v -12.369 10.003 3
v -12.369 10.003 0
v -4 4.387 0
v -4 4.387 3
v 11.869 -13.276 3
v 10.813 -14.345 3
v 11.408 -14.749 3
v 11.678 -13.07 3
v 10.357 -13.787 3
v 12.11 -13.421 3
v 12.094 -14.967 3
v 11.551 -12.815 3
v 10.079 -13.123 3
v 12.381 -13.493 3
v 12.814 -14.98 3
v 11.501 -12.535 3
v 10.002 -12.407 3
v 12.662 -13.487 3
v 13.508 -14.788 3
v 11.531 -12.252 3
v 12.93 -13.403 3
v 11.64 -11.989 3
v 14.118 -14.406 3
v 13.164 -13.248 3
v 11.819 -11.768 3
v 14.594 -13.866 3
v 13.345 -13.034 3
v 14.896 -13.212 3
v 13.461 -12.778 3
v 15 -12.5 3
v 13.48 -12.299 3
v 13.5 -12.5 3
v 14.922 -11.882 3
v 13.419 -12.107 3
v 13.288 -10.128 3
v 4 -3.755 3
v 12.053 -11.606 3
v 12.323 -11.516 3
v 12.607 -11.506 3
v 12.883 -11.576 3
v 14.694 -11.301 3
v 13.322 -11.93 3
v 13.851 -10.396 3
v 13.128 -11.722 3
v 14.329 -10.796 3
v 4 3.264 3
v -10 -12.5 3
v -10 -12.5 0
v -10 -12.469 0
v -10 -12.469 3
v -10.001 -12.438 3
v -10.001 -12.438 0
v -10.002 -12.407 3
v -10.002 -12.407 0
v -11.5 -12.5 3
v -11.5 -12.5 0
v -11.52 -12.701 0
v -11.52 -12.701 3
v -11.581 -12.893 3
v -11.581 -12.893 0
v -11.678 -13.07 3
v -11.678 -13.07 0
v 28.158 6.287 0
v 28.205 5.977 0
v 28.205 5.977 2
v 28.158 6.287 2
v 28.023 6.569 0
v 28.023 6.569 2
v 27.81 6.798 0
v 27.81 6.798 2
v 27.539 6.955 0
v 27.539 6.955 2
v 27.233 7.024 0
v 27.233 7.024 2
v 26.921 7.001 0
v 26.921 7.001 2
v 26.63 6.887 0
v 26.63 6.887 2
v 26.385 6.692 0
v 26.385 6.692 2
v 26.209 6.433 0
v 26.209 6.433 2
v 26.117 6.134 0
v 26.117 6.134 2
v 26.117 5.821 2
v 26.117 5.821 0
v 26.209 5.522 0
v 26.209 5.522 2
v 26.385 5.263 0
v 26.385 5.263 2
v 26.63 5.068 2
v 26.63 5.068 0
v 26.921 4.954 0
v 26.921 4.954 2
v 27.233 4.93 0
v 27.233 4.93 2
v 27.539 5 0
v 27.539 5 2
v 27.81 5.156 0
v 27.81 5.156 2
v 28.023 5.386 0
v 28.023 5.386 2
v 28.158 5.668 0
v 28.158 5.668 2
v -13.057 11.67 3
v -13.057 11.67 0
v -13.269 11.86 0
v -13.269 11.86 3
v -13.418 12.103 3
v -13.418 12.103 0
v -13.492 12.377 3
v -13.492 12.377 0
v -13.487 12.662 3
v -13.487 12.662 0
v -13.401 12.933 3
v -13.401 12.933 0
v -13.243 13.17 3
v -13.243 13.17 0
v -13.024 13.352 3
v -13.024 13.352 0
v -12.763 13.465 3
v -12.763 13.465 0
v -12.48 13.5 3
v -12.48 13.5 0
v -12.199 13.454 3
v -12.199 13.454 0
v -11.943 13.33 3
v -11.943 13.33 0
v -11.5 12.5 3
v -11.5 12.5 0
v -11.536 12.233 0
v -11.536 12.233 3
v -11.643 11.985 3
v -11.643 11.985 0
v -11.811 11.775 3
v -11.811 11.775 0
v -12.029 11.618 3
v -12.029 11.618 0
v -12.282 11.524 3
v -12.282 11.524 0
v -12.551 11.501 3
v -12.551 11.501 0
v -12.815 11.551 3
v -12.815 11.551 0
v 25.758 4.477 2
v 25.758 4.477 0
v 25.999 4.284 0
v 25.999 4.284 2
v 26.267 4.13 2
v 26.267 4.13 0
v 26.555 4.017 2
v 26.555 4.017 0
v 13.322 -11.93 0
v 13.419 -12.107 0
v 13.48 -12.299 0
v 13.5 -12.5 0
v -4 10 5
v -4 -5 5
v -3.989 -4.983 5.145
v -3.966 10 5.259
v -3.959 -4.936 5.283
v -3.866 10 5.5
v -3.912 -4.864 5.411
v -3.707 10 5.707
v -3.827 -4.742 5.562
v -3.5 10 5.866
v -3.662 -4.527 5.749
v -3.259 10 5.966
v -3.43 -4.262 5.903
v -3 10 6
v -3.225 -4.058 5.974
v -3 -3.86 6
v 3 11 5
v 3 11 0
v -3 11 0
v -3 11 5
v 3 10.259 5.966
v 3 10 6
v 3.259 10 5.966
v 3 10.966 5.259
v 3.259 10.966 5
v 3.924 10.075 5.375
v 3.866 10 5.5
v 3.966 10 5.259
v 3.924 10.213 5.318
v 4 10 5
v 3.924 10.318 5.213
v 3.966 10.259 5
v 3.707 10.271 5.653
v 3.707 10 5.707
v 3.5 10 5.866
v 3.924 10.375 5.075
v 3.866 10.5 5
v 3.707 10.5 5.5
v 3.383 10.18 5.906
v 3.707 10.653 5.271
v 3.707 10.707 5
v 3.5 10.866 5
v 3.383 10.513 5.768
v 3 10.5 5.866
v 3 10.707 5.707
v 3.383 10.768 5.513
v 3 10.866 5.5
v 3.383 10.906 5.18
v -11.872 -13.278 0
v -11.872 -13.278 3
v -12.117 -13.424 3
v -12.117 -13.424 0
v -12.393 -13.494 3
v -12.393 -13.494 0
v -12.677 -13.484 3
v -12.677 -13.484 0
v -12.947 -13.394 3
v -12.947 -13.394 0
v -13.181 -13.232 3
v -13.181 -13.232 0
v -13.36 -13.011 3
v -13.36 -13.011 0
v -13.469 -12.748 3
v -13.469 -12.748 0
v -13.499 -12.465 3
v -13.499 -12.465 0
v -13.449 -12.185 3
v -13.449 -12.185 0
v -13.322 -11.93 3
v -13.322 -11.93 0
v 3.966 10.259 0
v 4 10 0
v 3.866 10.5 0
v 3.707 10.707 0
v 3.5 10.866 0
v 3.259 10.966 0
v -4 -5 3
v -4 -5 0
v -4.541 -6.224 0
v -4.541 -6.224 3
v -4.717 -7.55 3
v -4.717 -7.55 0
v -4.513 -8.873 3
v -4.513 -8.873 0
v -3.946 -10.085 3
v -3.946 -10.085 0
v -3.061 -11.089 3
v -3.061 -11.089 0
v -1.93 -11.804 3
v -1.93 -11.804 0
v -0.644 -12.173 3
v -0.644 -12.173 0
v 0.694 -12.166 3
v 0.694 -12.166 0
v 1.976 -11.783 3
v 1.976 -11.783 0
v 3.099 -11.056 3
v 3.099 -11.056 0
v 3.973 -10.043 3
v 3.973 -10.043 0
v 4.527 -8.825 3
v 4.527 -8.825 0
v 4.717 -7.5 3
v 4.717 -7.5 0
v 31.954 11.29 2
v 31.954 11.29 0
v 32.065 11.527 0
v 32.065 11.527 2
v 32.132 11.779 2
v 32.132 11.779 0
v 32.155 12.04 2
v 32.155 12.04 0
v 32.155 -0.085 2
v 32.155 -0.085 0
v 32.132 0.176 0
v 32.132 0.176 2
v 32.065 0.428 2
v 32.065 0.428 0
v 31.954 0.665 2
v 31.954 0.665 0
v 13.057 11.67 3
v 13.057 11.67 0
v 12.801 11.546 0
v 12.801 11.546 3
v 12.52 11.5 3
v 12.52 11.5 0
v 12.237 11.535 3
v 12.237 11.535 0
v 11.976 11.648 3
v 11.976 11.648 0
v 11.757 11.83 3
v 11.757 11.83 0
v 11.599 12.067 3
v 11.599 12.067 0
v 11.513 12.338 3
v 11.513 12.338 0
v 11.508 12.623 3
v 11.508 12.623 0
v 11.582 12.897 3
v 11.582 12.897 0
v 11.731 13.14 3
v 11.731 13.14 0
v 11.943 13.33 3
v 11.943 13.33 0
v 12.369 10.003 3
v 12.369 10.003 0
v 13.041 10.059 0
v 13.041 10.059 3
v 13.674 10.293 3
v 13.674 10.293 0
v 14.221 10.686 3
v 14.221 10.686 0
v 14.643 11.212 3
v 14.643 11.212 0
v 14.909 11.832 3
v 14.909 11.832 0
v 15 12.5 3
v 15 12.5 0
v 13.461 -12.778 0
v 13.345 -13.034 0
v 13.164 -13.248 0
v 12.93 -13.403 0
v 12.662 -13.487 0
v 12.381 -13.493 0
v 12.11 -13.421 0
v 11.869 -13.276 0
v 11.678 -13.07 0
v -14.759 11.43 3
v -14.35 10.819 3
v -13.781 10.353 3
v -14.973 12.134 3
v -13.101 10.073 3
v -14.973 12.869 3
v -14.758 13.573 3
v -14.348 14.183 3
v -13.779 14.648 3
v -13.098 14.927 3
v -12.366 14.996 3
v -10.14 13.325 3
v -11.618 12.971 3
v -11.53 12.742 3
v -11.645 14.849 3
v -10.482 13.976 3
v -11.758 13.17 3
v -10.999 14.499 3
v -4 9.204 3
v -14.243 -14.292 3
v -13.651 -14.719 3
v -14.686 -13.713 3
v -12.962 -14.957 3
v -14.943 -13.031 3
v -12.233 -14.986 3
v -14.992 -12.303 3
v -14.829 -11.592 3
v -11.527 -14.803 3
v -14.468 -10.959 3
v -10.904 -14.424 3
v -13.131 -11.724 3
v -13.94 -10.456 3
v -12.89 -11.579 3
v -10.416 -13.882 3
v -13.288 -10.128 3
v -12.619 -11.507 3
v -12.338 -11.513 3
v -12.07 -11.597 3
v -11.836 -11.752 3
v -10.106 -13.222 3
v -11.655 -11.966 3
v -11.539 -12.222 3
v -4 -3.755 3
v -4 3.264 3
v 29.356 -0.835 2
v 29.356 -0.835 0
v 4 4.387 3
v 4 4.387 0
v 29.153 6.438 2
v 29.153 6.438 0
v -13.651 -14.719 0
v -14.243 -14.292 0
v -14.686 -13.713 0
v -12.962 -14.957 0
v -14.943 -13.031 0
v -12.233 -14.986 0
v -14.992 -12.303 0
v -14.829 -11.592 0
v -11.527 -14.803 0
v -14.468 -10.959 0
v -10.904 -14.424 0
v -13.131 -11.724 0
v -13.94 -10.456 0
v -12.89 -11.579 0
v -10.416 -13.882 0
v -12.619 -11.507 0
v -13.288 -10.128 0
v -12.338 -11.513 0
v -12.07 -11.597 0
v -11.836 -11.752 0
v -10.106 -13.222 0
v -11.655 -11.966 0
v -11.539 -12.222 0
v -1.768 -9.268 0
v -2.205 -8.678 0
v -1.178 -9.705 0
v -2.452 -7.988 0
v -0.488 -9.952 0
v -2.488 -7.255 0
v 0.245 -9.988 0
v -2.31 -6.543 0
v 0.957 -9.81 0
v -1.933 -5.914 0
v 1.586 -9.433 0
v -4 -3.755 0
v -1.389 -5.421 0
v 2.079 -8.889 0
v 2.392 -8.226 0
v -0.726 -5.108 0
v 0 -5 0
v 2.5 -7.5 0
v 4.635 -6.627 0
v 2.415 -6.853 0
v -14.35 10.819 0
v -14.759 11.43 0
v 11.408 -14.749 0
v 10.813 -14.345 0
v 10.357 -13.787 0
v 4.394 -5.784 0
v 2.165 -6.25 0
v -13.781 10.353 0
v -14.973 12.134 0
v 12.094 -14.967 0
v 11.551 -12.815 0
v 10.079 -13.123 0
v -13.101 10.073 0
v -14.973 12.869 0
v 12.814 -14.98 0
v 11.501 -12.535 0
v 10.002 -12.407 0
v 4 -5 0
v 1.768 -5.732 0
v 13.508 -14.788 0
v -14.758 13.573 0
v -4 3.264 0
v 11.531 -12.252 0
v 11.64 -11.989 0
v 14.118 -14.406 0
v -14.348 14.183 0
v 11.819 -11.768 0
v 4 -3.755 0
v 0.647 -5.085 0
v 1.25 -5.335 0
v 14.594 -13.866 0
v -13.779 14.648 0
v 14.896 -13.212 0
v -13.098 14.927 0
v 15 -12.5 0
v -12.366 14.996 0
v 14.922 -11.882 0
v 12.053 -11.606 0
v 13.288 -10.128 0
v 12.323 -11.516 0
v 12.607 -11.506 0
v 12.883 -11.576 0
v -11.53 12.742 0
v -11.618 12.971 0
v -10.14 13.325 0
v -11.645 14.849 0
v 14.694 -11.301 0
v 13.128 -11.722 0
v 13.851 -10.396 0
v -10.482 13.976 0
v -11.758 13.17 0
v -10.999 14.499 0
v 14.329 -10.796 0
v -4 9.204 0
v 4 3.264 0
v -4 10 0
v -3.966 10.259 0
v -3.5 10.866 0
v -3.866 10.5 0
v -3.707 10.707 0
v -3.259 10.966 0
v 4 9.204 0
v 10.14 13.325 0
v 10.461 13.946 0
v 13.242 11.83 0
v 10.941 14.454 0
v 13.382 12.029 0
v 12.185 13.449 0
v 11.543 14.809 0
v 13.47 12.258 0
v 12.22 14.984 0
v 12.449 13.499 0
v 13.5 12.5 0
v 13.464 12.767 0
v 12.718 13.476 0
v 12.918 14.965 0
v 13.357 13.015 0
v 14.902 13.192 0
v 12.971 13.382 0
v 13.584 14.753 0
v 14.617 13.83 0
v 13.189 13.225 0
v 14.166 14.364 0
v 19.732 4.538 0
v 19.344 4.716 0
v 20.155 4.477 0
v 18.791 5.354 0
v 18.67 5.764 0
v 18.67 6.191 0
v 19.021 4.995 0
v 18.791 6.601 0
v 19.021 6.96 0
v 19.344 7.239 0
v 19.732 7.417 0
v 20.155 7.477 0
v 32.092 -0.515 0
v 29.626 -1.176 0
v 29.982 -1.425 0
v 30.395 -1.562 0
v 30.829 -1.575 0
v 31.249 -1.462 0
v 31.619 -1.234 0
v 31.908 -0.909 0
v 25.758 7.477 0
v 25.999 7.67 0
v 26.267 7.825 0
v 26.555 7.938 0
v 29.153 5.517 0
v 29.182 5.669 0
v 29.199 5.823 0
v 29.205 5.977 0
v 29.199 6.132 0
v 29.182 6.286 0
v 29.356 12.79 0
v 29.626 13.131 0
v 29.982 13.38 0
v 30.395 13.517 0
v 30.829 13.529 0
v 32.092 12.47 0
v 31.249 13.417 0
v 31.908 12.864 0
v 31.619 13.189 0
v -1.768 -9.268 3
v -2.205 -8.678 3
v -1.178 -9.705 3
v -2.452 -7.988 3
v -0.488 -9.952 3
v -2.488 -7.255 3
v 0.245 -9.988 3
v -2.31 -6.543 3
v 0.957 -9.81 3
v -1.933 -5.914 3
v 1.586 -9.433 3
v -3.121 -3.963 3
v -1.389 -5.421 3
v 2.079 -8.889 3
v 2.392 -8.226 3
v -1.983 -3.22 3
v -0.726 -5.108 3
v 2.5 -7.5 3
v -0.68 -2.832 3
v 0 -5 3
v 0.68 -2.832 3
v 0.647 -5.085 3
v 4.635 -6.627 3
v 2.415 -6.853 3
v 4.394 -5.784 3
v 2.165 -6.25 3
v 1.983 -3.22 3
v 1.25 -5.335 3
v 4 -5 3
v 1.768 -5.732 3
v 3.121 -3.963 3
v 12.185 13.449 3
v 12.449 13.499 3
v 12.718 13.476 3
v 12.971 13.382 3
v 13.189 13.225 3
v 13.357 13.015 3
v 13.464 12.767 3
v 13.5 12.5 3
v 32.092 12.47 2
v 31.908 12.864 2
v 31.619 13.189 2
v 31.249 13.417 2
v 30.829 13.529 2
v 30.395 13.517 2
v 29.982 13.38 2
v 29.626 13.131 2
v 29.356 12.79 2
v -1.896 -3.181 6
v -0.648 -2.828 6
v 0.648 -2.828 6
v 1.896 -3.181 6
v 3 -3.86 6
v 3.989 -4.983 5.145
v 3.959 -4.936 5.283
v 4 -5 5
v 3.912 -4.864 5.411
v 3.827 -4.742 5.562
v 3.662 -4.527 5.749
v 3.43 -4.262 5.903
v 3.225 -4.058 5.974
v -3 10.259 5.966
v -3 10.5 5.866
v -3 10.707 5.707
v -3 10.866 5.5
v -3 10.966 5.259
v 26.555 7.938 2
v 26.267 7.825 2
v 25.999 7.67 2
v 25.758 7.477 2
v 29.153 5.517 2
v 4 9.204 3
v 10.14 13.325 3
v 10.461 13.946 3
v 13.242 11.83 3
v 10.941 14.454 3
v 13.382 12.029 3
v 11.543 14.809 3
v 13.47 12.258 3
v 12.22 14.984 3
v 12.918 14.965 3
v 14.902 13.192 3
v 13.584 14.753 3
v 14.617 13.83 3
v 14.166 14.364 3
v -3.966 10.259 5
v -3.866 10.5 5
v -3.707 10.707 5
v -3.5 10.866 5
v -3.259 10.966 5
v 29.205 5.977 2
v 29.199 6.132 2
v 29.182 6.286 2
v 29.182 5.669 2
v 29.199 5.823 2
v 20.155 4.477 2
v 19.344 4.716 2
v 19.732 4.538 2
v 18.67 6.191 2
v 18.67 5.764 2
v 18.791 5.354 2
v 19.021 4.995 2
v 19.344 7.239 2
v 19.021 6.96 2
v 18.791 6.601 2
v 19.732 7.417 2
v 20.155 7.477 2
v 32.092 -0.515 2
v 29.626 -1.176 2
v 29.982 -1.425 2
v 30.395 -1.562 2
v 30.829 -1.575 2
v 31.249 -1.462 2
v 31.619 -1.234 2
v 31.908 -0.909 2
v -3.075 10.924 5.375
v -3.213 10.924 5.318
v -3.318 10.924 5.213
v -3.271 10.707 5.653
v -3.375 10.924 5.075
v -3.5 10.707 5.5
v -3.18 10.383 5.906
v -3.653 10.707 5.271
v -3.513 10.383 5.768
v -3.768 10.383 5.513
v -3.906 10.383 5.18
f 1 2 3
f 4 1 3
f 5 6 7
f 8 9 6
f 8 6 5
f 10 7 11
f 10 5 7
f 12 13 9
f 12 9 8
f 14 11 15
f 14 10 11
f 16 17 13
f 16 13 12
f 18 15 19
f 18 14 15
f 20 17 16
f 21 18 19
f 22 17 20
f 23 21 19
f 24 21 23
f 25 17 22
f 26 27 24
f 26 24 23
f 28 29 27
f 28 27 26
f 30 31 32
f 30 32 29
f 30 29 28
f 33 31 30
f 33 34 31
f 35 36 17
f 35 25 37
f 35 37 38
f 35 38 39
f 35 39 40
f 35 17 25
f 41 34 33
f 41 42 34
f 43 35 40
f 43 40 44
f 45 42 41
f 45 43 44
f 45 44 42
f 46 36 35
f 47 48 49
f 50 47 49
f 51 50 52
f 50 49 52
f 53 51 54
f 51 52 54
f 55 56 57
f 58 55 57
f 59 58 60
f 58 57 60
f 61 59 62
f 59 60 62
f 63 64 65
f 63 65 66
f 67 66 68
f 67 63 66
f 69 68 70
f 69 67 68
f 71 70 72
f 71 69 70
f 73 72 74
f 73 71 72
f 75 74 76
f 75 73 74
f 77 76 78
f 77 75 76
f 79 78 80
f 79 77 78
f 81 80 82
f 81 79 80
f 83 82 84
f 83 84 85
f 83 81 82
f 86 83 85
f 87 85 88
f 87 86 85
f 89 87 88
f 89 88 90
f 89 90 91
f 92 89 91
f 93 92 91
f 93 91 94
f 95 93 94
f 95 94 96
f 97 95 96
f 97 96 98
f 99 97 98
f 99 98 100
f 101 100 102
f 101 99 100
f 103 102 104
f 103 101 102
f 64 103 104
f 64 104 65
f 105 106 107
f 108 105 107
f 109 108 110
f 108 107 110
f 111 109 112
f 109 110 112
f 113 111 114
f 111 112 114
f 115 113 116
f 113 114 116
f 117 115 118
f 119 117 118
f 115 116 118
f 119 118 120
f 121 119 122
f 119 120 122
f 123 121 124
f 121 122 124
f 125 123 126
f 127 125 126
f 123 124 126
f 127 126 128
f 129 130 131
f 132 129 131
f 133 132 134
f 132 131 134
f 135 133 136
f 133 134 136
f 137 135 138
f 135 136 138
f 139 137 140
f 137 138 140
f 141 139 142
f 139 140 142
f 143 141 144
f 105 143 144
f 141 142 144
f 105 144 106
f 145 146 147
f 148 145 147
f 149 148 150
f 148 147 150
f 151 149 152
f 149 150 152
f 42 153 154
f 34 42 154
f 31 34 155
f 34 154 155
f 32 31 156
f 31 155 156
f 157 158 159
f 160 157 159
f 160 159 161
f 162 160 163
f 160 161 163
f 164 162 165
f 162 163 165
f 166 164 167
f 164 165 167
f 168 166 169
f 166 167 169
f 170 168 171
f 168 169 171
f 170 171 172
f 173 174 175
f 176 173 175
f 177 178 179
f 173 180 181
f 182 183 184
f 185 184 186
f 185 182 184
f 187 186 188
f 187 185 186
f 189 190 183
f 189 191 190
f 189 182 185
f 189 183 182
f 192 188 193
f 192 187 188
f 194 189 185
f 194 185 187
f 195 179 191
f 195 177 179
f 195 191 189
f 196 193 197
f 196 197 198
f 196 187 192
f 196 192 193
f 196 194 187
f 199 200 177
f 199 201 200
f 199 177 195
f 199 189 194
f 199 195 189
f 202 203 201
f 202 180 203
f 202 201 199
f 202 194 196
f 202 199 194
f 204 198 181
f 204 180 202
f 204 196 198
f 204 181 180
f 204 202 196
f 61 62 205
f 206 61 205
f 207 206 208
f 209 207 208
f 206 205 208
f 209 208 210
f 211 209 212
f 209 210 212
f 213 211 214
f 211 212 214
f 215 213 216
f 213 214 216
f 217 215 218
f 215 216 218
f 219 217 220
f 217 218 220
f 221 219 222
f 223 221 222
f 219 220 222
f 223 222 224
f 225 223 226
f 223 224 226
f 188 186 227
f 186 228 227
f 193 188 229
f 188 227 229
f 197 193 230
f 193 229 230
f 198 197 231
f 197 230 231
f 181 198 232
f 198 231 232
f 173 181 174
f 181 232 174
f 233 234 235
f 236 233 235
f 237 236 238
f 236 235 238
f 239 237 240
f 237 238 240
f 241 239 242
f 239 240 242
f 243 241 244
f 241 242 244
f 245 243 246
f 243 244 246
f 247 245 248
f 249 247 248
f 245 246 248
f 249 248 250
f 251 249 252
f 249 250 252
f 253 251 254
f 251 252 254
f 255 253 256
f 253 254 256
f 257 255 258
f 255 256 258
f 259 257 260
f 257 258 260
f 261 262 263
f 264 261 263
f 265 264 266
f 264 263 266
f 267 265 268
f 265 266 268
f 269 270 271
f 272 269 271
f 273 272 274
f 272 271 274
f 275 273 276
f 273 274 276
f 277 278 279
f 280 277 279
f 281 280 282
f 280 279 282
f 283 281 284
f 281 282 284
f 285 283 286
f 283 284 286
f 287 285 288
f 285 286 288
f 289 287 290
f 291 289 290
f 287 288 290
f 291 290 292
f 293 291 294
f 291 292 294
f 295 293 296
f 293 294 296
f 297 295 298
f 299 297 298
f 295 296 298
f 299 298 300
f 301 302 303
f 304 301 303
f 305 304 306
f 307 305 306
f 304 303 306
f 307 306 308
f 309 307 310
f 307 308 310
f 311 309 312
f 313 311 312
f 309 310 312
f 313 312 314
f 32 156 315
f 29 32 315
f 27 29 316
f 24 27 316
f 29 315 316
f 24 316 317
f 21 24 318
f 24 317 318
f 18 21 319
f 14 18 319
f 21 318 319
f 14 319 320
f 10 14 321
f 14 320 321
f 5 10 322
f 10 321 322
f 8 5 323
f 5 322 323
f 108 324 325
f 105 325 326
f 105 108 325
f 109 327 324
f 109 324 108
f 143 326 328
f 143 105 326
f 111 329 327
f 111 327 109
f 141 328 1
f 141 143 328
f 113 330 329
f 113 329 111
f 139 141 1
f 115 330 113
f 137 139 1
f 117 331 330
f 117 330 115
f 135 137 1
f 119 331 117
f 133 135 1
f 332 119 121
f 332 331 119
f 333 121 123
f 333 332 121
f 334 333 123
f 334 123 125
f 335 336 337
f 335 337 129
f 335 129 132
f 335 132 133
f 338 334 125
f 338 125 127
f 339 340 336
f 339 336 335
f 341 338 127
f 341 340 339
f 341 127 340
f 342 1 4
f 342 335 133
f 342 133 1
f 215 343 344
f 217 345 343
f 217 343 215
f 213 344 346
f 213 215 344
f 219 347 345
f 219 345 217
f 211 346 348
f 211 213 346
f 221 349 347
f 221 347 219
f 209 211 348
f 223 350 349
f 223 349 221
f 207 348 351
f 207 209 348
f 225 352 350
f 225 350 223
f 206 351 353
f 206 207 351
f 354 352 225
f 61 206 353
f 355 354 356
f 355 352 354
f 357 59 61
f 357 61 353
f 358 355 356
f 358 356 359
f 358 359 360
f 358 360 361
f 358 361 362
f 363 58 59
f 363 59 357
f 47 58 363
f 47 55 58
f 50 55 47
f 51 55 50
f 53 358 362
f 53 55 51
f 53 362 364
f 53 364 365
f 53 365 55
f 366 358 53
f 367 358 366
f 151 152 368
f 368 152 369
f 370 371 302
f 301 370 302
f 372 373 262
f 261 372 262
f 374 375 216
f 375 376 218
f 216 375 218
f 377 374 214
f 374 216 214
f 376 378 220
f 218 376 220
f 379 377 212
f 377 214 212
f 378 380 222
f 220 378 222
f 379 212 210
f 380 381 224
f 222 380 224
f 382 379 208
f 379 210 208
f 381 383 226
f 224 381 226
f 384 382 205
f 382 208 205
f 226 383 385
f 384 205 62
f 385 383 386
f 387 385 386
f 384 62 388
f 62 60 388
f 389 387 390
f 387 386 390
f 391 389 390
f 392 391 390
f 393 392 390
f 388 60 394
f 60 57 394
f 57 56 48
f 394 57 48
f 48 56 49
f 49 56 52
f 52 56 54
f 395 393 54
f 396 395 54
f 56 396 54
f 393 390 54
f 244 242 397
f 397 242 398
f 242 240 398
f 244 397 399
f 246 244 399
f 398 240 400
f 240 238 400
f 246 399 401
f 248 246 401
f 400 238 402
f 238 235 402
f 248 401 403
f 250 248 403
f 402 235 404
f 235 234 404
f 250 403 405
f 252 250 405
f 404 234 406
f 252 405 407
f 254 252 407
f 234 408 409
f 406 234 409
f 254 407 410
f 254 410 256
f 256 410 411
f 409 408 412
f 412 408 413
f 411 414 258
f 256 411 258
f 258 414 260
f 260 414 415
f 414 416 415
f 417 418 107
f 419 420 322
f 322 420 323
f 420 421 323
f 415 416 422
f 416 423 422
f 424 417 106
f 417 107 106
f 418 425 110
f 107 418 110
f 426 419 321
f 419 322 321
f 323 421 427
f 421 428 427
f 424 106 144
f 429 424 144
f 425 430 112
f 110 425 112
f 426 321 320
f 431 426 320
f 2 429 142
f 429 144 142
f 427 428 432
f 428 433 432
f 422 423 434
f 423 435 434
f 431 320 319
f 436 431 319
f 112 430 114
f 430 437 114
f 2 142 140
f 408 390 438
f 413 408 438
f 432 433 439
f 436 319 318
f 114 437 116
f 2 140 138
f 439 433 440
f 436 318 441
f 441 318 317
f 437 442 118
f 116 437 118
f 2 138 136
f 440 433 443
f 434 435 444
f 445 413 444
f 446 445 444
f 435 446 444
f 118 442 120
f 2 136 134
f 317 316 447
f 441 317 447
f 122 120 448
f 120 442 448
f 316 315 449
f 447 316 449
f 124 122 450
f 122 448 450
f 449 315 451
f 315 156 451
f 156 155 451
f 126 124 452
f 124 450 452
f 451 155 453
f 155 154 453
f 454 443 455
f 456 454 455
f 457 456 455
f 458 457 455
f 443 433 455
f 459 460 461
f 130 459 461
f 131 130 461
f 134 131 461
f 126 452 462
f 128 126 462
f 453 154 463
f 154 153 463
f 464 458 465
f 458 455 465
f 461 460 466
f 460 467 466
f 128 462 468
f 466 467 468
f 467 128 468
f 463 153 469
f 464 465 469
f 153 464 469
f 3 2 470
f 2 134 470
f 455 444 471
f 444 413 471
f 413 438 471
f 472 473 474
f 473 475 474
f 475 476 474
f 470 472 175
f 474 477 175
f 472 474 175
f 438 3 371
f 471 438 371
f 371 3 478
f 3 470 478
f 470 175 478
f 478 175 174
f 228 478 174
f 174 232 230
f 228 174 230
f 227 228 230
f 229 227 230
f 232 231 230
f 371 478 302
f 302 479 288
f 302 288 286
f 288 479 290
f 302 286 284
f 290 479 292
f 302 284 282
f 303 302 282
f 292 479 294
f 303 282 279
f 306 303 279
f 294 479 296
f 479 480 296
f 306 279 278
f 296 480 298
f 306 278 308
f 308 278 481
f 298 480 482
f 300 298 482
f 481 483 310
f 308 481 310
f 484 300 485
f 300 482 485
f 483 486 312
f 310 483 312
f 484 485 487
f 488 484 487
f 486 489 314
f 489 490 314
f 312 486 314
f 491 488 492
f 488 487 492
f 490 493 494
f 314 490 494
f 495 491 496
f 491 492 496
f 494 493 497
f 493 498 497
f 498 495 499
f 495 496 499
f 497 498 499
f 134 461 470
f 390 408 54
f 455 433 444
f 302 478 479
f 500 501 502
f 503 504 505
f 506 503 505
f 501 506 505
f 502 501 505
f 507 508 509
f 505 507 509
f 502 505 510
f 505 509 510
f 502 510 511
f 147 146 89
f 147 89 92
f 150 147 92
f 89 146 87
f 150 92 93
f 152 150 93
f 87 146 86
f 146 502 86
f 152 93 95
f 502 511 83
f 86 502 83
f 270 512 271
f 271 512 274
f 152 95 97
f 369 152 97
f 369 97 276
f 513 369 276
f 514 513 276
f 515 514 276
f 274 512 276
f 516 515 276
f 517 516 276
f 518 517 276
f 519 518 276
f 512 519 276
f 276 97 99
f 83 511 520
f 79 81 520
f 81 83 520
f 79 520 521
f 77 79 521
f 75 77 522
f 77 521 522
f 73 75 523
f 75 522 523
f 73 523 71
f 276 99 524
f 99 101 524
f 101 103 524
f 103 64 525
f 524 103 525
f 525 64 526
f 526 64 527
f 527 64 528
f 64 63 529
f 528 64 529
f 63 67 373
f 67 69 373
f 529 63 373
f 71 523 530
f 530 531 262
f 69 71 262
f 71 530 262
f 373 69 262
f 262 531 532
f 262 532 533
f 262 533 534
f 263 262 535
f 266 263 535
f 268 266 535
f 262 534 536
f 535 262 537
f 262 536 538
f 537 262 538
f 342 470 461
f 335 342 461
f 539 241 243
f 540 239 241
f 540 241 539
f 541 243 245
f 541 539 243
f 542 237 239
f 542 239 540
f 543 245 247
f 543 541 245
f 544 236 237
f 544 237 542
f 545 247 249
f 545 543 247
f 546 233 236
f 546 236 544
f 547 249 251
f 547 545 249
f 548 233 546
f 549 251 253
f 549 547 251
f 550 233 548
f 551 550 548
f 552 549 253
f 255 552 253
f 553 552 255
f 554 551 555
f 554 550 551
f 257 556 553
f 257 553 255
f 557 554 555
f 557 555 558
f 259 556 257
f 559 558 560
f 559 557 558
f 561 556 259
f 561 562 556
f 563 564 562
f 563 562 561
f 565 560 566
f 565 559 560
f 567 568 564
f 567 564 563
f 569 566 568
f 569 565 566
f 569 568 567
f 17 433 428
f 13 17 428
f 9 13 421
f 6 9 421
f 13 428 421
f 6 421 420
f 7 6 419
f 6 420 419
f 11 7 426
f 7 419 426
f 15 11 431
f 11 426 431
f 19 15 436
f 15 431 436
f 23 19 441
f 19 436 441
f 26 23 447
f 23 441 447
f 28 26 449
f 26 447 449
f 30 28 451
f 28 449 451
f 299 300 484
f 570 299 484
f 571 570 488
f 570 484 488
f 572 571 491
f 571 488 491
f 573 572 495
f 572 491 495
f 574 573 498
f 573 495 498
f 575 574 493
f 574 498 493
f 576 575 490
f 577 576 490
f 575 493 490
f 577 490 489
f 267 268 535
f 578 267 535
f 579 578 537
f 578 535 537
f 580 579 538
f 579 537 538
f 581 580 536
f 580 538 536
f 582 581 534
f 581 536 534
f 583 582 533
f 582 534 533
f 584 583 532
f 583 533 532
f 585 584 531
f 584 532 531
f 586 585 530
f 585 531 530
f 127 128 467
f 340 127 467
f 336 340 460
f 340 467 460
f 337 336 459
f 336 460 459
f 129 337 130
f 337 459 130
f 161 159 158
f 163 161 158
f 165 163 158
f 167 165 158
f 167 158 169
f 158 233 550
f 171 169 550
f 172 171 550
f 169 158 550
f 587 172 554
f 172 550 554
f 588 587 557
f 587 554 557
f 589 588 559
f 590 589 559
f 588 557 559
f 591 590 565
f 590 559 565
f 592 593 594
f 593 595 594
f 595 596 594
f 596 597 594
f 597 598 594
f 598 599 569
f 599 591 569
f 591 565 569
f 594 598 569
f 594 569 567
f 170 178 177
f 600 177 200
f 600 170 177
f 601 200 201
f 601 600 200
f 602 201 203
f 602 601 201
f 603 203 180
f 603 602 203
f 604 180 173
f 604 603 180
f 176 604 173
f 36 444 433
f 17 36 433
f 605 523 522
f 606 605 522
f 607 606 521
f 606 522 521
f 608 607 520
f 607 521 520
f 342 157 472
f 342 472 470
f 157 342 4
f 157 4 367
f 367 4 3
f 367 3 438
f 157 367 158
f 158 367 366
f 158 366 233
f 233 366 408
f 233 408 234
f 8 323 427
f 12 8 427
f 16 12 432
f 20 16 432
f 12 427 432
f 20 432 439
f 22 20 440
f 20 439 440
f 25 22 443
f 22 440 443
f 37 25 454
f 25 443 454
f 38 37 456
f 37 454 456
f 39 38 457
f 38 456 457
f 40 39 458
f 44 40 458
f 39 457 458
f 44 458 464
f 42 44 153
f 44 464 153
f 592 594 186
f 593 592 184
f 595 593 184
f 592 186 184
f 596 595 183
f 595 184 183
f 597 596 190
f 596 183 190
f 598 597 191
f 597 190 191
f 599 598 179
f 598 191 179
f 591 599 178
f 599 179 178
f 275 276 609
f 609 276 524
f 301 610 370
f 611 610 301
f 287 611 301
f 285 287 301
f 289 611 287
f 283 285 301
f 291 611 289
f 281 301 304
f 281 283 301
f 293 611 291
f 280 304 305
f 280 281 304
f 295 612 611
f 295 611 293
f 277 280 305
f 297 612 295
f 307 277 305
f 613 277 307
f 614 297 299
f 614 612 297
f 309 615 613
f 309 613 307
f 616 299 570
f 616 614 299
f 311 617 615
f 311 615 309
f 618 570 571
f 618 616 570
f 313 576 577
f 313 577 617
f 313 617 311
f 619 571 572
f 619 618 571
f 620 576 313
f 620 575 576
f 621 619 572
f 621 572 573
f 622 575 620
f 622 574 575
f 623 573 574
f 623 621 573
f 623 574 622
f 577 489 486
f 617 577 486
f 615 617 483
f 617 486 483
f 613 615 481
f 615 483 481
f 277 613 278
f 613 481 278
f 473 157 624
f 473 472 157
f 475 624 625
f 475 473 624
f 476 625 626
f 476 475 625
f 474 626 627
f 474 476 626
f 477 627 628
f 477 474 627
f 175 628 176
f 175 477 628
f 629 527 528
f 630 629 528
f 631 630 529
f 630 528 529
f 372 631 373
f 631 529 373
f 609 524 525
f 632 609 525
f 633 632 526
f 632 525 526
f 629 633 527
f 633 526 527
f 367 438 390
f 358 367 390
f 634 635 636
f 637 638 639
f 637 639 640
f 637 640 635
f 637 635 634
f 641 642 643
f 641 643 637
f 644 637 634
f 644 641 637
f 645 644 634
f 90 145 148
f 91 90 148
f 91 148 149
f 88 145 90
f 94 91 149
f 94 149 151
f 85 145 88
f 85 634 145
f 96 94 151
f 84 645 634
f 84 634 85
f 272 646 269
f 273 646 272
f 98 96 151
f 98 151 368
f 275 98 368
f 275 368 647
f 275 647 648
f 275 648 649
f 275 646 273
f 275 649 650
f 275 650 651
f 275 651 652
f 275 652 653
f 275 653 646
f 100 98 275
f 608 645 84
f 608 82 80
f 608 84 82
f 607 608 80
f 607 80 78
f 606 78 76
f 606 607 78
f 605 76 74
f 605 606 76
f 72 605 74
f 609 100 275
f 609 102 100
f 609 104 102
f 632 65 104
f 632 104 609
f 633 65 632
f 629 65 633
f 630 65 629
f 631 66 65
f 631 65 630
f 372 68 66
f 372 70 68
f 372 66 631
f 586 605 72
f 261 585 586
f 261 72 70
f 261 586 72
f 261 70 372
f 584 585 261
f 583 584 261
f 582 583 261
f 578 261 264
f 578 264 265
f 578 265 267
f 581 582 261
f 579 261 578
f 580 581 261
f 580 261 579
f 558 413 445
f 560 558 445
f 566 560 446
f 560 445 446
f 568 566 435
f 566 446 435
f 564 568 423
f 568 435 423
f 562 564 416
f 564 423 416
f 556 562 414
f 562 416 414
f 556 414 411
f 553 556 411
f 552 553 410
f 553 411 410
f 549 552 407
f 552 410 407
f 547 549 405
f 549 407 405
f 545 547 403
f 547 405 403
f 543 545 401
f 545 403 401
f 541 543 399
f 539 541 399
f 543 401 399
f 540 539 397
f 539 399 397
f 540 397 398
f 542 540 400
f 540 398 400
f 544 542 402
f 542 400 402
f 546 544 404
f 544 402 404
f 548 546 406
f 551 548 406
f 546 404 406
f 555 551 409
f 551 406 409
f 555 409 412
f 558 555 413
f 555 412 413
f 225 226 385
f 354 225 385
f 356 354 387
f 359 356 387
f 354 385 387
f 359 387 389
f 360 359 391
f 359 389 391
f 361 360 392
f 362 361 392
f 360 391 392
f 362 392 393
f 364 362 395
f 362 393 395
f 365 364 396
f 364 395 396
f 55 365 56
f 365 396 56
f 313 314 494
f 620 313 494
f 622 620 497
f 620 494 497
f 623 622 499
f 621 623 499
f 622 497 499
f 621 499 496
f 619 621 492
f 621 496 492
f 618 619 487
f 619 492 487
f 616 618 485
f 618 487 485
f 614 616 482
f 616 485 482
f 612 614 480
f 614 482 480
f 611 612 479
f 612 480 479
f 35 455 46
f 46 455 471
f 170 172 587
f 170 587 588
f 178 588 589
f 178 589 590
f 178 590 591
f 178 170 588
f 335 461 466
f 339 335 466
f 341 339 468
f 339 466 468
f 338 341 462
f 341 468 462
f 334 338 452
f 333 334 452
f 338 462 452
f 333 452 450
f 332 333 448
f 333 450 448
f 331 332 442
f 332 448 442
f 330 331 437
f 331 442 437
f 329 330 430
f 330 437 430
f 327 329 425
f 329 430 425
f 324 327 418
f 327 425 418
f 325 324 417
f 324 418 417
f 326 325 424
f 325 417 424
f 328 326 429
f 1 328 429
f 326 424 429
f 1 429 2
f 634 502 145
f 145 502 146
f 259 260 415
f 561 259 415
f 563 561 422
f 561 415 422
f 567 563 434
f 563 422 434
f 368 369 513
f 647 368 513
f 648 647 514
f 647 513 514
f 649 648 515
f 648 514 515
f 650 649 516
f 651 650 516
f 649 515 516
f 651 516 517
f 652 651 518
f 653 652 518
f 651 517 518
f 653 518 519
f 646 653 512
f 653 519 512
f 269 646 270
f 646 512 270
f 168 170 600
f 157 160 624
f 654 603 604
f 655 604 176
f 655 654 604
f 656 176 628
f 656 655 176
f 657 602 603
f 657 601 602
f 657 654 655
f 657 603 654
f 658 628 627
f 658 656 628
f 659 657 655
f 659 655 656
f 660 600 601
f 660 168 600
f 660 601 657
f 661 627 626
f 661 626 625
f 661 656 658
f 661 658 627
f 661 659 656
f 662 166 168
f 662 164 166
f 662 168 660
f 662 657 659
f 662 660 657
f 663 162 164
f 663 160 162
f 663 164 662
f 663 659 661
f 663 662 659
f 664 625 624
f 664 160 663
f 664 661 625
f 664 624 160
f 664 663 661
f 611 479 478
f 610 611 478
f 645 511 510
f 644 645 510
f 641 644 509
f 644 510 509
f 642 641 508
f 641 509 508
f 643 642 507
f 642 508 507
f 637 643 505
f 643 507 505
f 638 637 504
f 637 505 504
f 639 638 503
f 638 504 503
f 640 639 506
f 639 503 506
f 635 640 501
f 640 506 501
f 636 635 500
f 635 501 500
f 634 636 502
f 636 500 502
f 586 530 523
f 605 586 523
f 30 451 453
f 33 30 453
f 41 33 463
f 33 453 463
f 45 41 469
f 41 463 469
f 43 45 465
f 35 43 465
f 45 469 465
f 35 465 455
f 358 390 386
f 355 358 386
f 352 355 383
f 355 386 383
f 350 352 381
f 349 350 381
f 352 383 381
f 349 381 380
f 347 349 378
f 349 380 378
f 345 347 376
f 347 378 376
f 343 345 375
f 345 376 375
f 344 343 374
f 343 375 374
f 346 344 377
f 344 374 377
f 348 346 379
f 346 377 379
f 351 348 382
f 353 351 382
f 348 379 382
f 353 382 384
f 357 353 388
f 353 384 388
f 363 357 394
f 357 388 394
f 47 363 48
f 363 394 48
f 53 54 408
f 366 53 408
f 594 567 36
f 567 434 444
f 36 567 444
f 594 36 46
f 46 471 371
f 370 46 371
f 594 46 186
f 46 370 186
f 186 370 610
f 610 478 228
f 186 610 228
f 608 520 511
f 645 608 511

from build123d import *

# Parameters (mm, degrees)
F1_DEPTH = 3
F2_DEPTH = 6
F0_R     = 1.05
F3_DEPTH = 2
F4_R     = 1


with BuildPart() as f1:
    # F0 (on Top) → F1 (new body)
    with BuildSketch(Plane.XY):
        with BuildLine():
            ThreePointArc((-13.0572436168, 11.669650946), (-13.330349054, 13.0572436168), (-11.9427563832, 13.330349054))
            Line((-11.9427563832, 13.330349054), (-10.0401876865, 12.0535435267))
            ThreePointArc((-10.0401876865, 12.0535435267), (-10.0100671913, 12.2758692164), (-10, 12.5))
            ThreePointArc((-10, 12.5), (-10.0352457489, 12.9183138554), (-10.1399891853, 13.3248326828))
            ThreePointArc((-10.1399891853, 13.3248326828), (-14.575872635, 13.8931090421), (-12.3689636526, 10.0034364667))
            ThreePointArc((-12.3689636526, 10.0034364667), (-11.7365731215, 10.1194161638), (-11.1546749202, 10.3928454187))
            Line((-11.1546749202, 10.3928454187), (-13.0572436168, 11.669650946))
        make_face()
        with BuildLine():
            ThreePointArc((-10, 12.5), (-10.0100671913, 12.2758692164), (-10.0401876865, 12.0535435267))
            Line((-10.0401876865, 12.0535435267), (-4, 8))
            Line((-4, 8), (-4, 9.204312807))
            Line((-4, 9.204312807), (-10.1399891853, 13.3248326828))
            ThreePointArc((-10.1399891853, 13.3248326828), (-10.0352457489, 12.9183138554), (-10, 12.5))
        make_face()
        with BuildLine():
            Line((-4, 8), (-10.0401876865, 12.0535435267))
            ThreePointArc((-10.0401876865, 12.0535435267), (-10.424127365, 11.1068909579), (-11.1546749202, 10.3928454187))
            Line((-11.1546749202, 10.3928454187), (-4, 5.5913743861))
            Line((-4, 5.5913743861), (-4, 8))
        make_face()
        with BuildLine():
            ThreePointArc((-11.9427563832, 13.330349054), (-11.6176045057, 12.9705084394), (-11.5, 12.5))
            ThreePointArc((-11.5, 12.5), (-12.0294915606, 11.6176045057), (-13.0572436168, 11.669650946))
            Line((-13.0572436168, 11.669650946), (-11.1546749202, 10.3928454187))
            ThreePointArc((-11.1546749202, 10.3928454187), (-10.424127365, 11.1068909579), (-10.0401876865, 12.0535435267))
            Line((-10.0401876865, 12.0535435267), (-11.9427563832, 13.330349054))
        make_face()
        with BuildLine():
            Line((-4, 5.5913743861), (-11.1546749202, 10.3928454187))
            ThreePointArc((-11.1546749202, 10.3928454187), (-11.7365731215, 10.1194161638), (-12.3689636526, 10.0034364667))
            Line((-12.3689636526, 10.0034364667), (-4, 4.3870615791))
            Line((-4, 4.3870615791), (-4, 5.5913743861))
        make_face()
        with BuildLine():
            Line((-4, 9.204312807), (-4, 8))
            Line((-4, 8), (-4, 5.5913743861))
            Line((-4, 5.5913743861), (-4, 4.3870615791))
            Line((-4, 4.3870615791), (-4, 3.2637324411))
            Line((-4, 3.2637324411), (-4, 1.5091549607))
            Line((-4, 1.5091549607), (-4, -2))
            Line((-4, -2), (-4, -3.7545774804))
            Line((-4, -3.7545774804), (-4, -5))
            ThreePointArc((-4, -5), (0, -2.783009434), (4, -5))
            Line((4, -5), (4, -3.7545774804))
            Line((4, -3.7545774804), (4, -2))
            Line((4, -2), (4, 1.5091549607))
            Line((4, 1.5091549607), (4, 3.2637324411))
            Line((4, 3.2637324411), (4, 4.3870615791))
            Line((4, 4.3870615791), (4, 5.5913743861))
            Line((4, 5.5913743861), (4, 8))
            Line((4, 8), (4, 9.204312807))
            Line((4, 9.204312807), (4, 11))
            Line((4, 11), (-4, 11))
            Line((-4, 11), (-4, 9.204312807))
        make_face()
        with BuildLine():
            Line((10.1399891853, 13.3248326828), (4, 9.204312807))
            Line((4, 9.204312807), (4, 8))
            Line((4, 8), (10.0401876865, 12.0535435267))
            ThreePointArc((10.0401876865, 12.0535435267), (10.007668205, 12.6956584365), (10.1399891853, 13.3248326828))
        make_face()
        with BuildLine():
            ThreePointArc((15, 12.5), (12.9183138554, 14.9647542511), (10.1399891853, 13.3248326828))
            ThreePointArc((10.1399891853, 13.3248326828), (10.007668205, 12.6956584365), (10.0401876865, 12.0535435267))
            Line((10.0401876865, 12.0535435267), (11.9427563832, 13.330349054))
            ThreePointArc((11.9427563832, 13.330349054), (12.9705084394, 13.3823954943), (13.5, 12.5))
            ThreePointArc((13.5, 12.5), (13.3823954943, 12.0294915606), (13.0572436168, 11.669650946))
            Line((13.0572436168, 11.669650946), (11.1546749202, 10.3928454187))
            ThreePointArc((11.1546749202, 10.3928454187), (11.7365731215, 10.1194161638), (12.3689636526, 10.0034364667))
            ThreePointArc((12.3689636526, 10.0034364667), (14.2208150876, 10.686496365), (15, 12.5))
        make_face()
        with BuildLine():
            Line((11.9427563832, 13.330349054), (10.0401876865, 12.0535435267))
            ThreePointArc((10.0401876865, 12.0535435267), (10.424127365, 11.1068909579), (11.1546749202, 10.3928454187))
            Line((11.1546749202, 10.3928454187), (13.0572436168, 11.669650946))
            ThreePointArc((13.0572436168, 11.669650946), (11.669650946, 11.9427563832), (11.9427563832, 13.330349054))
        make_face()
        with BuildLine():
            Line((10.0401876865, 12.0535435267), (4, 8))
            Line((4, 8), (4, 5.5913743861))
            Line((4, 5.5913743861), (11.1546749202, 10.3928454187))
            ThreePointArc((11.1546749202, 10.3928454187), (10.424127365, 11.1068909579), (10.0401876865, 12.0535435267))
        make_face()
        with BuildLine():
            Line((11.1546749202, 10.3928454187), (4, 5.5913743861))
            Line((4, 5.5913743861), (4, 4.3870615791))
            Line((4, 4.3870615791), (12.3689636526, 10.0034364667))
            ThreePointArc((12.3689636526, 10.0034364667), (11.7365731215, 10.1194161638), (11.1546749202, 10.3928454187))
        make_face()
        with BuildLine():
            Line((13.2884690251, -10.127592658), (4, 3.2637324411))
            Line((4, 3.2637324411), (4, 1.5091549607))
            Line((4, 1.5091549607), (12.0157963331, -10.0473388312))
            ThreePointArc((12.0157963331, -10.0473388312), (12.657335696, -10.0049558163), (13.2884690251, -10.127592658))
        make_face()
        with BuildLine():
            Line((12.0157963331, -10.0473388312), (4, 1.5091549607))
            Line((4, 1.5091549607), (4, -2))
            Line((4, -2), (10.3724206329, -11.187214398))
            ThreePointArc((10.3724206329, -11.187214398), (11.0751555414, -10.4457803747), (12.0157963331, -10.0473388312))
        make_face()
        with BuildLine():
            Line((4, -2), (4, -3.7545774804))
            Line((4, -3.7545774804), (10.0017176246, -12.4073437917))
            ThreePointArc((10.0017176246, -12.4073437917), (10.1079656881, -11.7732456738), (10.3724206329, -11.187214398))
            Line((10.3724206329, -11.187214398), (4, -2))
        make_face()
        with BuildLine():
            Line((-4, 1.5091549607), (-4, 3.2637324411))
            Line((-4, 3.2637324411), (-13.2884690251, -10.127592658))
            ThreePointArc((-13.2884690251, -10.127592658), (-12.657335696, -10.0049558163), (-12.0157963331, -10.0473388312))
            Line((-12.0157963331, -10.0473388312), (-4, 1.5091549607))
        make_face()
        with BuildLine():
            Line((-4, -2), (-4, 1.5091549607))
            Line((-4, 1.5091549607), (-12.0157963331, -10.0473388312))
            ThreePointArc((-12.0157963331, -10.0473388312), (-11.0751555414, -10.4457803747), (-10.3724206329, -11.187214398))
            Line((-10.3724206329, -11.187214398), (-4, -2))
        make_face()
        with BuildLine():
            Line((-4, -3.7545774804), (-4, -2))
            Line((-4, -2), (-10.3724206329, -11.187214398))
            ThreePointArc((-10.3724206329, -11.187214398), (-10.1079656881, -11.7732456738), (-10.0017176246, -12.4073437917))
            Line((-10.0017176246, -12.4073437917), (-4, -3.7545774804))
        make_face()
        with BuildLine():
            ThreePointArc((-12.0157963331, -10.0473388312), (-12.657335696, -10.0049558163), (-13.2884690251, -10.127592658))
            ThreePointArc((-13.2884690251, -10.127592658), (-13.9626734833, -14.5274580837), (-10, -12.5))
            ThreePointArc((-10, -12.5), (-10.000429443, -12.4536639364), (-10.0017176246, -12.4073437917))
            ThreePointArc((-10.0017176246, -12.4073437917), (-10.1079656881, -11.7732456738), (-10.3724206329, -11.187214398))
            Line((-10.3724206329, -11.187214398), (-11.6783121499, -13.0699377834))
            ThreePointArc((-11.6783121499, -13.0699377834), (-13.0699377834, -13.3216878501), (-13.3216878501, -11.9300622166))
            Line((-13.3216878501, -11.9300622166), (-12.0157963331, -10.0473388312))
        make_face()
        with BuildLine():
            ThreePointArc((-10.3724206329, -11.187214398), (-11.0751555414, -10.4457803747), (-12.0157963331, -10.0473388312))
            Line((-12.0157963331, -10.0473388312), (-13.3216878501, -11.9300622166))
            ThreePointArc((-13.3216878501, -11.9300622166), (-12.2014098546, -11.5456185642), (-11.5, -12.5))
            ThreePointArc((-11.5, -12.5), (-11.5456185642, -12.7985901454), (-11.6783121499, -13.0699377834))
            Line((-11.6783121499, -13.0699377834), (-10.3724206329, -11.187214398))
        make_face()
        with BuildLine():
            ThreePointArc((15, -12.5), (14.5274580837, -11.0373265167), (13.2884690251, -10.127592658))
            ThreePointArc((13.2884690251, -10.127592658), (12.657335696, -10.0049558163), (12.0157963331, -10.0473388312))
            Line((12.0157963331, -10.0473388312), (13.3216878501, -11.9300622166))
            ThreePointArc((13.3216878501, -11.9300622166), (13.4543814358, -12.2014098546), (13.5, -12.5))
            ThreePointArc((13.5, -12.5), (12.7985901454, -13.4543814358), (11.6783121499, -13.0699377834))
            Line((11.6783121499, -13.0699377834), (10.3724206329, -11.187214398))
            ThreePointArc((10.3724206329, -11.187214398), (10.1079656881, -11.7732456738), (10.0017176246, -12.4073437917))
            ThreePointArc((10.0017176246, -12.4073437917), (12.4536639364, -14.999570557), (15, -12.5))
        make_face()
        with BuildLine():
            Line((13.3216878501, -11.9300622166), (12.0157963331, -10.0473388312))
            ThreePointArc((12.0157963331, -10.0473388312), (11.0751555414, -10.4457803747), (10.3724206329, -11.187214398))
            Line((10.3724206329, -11.187214398), (11.6783121499, -13.0699377834))
            ThreePointArc((11.6783121499, -13.0699377834), (11.9300622166, -11.6783121499), (13.3216878501, -11.9300622166))
        make_face()
        with BuildLine():
            ThreePointArc((4, -5), (0, -2.783009434), (-4, -5))
            Line((-4, -5), (0, -5))
            Line((0, -5), (4, -5))
        make_face()
        with BuildLine():
            Line((0, -5), (-4, -5))
            ThreePointArc((-4, -5), (-1.3003918132, -12.0342012673), (4.716990566, -7.5))
            ThreePointArc((4.716990566, -7.5), (4.5342012673, -6.1996081868), (4, -5))
            Line((4, -5), (0, -5))
        make_face()
        with BuildLine():
            ThreePointArc((2.5, -7.5), (-1.767766953, -9.267766953), (0, -5))
            ThreePointArc((0, -5), (1.767766953, -5.732233047), (2.5, -7.5))
        make_face(mode=Mode.SUBTRACT)
    extrude(amount=F1_DEPTH)

    # F0 (on Top) → F2 (join)
    with BuildSketch(Plane.XY):
        with BuildLine():
            Line((-4, 9.204312807), (-4, 8))
            Line((-4, 8), (-4, 5.5913743861))
            Line((-4, 5.5913743861), (-4, 4.3870615791))
            Line((-4, 4.3870615791), (-4, 3.2637324411))
            Line((-4, 3.2637324411), (-4, 1.5091549607))
            Line((-4, 1.5091549607), (-4, -2))
            Line((-4, -2), (-4, -3.7545774804))
            Line((-4, -3.7545774804), (-4, -5))
            ThreePointArc((-4, -5), (0, -2.783009434), (4, -5))
            Line((4, -5), (4, -3.7545774804))
            Line((4, -3.7545774804), (4, -2))
            Line((4, -2), (4, 1.5091549607))
            Line((4, 1.5091549607), (4, 3.2637324411))
            Line((4, 3.2637324411), (4, 4.3870615791))
            Line((4, 4.3870615791), (4, 5.5913743861))
            Line((4, 5.5913743861), (4, 8))
            Line((4, 8), (4, 9.204312807))
            Line((4, 9.204312807), (4, 11))
            Line((4, 11), (-4, 11))
            Line((-4, 11), (-4, 9.204312807))
        make_face()
    extrude(amount=F2_DEPTH)

    # F4
    f4_edges = [f1.edges().sort_by_distance(p)[0] for p in [
        (-4, 3, 6),
        (0, 11, 6),
        (4, 3, 6),
        (4, 11, 3),
        (-4, 11, 3),
    ]]
    fillet(f4_edges, radius=F4_R)


with BuildPart() as f3:
    # F0 (on Top) → F3 (new body)
    with BuildSketch(Plane.XY):
        with BuildLine():
            Line((31.9540518606, 0.6652427755), (29.1527112913, 5.517306971))
            ThreePointArc((29.1527112913, 5.517306971), (28.180013755, 4.2020685242), (26.5546350799, 4.017306971))
            Line((26.5546350799, 4.017306971), (29.3559756493, -0.8347572245))
            ThreePointArc((29.3559756493, -0.8347572245), (29.905013755, 1.2142808812), (31.9540518606, 0.6652427755))
        make_face()
        with BuildLine():
            ThreePointArc((21.655013755, 5.977420602), (21.2156739267, 7.0380807738), (20.155013755, 7.477420602))
            ThreePointArc((20.155013755, 7.477420602), (18.655013755, 5.977420602), (20.155013755, 4.477420602))
            ThreePointArc((20.155013755, 4.477420602), (21.2156739267, 4.9167604302), (21.655013755, 5.977420602))
        make_face()
        with BuildLine():
            ThreePointArc((32.155013755, -0.0847572245), (32.1039024944, 0.3034713432), (31.9540518606, 0.6652427755))
            ThreePointArc((31.9540518606, 0.6652427755), (29.905013755, 1.2142808812), (29.3559756493, -0.8347572245))
            ThreePointArc((29.3559756493, -0.8347572245), (31.0432423226, -1.5336459639), (32.155013755, -0.0847572245))
        make_face()
        with BuildLine():
            ThreePointArc((29.3559756493, 12.7895984285), (29.905013755, 10.7405603228), (31.9540518606, 11.2895984285))
            ThreePointArc((31.9540518606, 11.2895984285), (32.1039024944, 11.6513698608), (32.155013755, 12.0395984285))
            ThreePointArc((32.155013755, 12.0395984285), (31.0432423226, 13.4884871679), (29.3559756493, 12.7895984285))
        make_face()
        with BuildLine():
            ThreePointArc((26.5546350799, 7.937534233), (28.180013755, 7.7527726798), (29.1527112913, 6.437534233))
            Line((29.1527112913, 6.437534233), (31.9540518606, 11.2895984285))
            ThreePointArc((31.9540518606, 11.2895984285), (29.905013755, 10.7405603228), (29.3559756493, 12.7895984285))
            Line((29.3559756493, 12.7895984285), (26.5546350799, 7.937534233))
        make_face()
        with BuildLine():
            ThreePointArc((25.7576948937, 4.477420602), (25.105013755, 5.977420602), (25.7576948937, 7.477420602))
            Line((25.7576948937, 7.477420602), (20.155013755, 7.477420602))
            ThreePointArc((20.155013755, 7.477420602), (21.2156739267, 7.0380807738), (21.655013755, 5.977420602))
            ThreePointArc((21.655013755, 5.977420602), (21.2156739267, 4.9167604302), (20.155013755, 4.477420602))
            Line((20.155013755, 4.477420602), (25.7576948937, 4.477420602))
        make_face()
        with BuildLine():
            ThreePointArc((29.1527112913, 5.517306971), (29.1918961705, 5.7458822136), (29.205013755, 5.977420602))
            ThreePointArc((29.205013755, 5.977420602), (29.1918961705, 6.2089589904), (29.1527112913, 6.437534233))
            ThreePointArc((29.1527112913, 6.437534233), (28.180013755, 7.7527726798), (26.5546350799, 7.937534233))
            ThreePointArc((26.5546350799, 7.937534233), (26.130013755, 7.7527726798), (25.7576948937, 7.477420602))
            ThreePointArc((25.7576948937, 7.477420602), (25.105013755, 5.977420602), (25.7576948937, 4.477420602))
            ThreePointArc((25.7576948937, 4.477420602), (26.130013755, 4.2020685242), (26.5546350799, 4.017306971))
            ThreePointArc((26.5546350799, 4.017306971), (28.180013755, 4.2020685242), (29.1527112913, 5.517306971))
        make_face()
        with Locations((27.155013755, 5.977420602)):
            Circle(F0_R, mode=Mode.SUBTRACT)
    extrude(amount=F3_DEPTH)


solid = Compound([f1.part, f3.part])
